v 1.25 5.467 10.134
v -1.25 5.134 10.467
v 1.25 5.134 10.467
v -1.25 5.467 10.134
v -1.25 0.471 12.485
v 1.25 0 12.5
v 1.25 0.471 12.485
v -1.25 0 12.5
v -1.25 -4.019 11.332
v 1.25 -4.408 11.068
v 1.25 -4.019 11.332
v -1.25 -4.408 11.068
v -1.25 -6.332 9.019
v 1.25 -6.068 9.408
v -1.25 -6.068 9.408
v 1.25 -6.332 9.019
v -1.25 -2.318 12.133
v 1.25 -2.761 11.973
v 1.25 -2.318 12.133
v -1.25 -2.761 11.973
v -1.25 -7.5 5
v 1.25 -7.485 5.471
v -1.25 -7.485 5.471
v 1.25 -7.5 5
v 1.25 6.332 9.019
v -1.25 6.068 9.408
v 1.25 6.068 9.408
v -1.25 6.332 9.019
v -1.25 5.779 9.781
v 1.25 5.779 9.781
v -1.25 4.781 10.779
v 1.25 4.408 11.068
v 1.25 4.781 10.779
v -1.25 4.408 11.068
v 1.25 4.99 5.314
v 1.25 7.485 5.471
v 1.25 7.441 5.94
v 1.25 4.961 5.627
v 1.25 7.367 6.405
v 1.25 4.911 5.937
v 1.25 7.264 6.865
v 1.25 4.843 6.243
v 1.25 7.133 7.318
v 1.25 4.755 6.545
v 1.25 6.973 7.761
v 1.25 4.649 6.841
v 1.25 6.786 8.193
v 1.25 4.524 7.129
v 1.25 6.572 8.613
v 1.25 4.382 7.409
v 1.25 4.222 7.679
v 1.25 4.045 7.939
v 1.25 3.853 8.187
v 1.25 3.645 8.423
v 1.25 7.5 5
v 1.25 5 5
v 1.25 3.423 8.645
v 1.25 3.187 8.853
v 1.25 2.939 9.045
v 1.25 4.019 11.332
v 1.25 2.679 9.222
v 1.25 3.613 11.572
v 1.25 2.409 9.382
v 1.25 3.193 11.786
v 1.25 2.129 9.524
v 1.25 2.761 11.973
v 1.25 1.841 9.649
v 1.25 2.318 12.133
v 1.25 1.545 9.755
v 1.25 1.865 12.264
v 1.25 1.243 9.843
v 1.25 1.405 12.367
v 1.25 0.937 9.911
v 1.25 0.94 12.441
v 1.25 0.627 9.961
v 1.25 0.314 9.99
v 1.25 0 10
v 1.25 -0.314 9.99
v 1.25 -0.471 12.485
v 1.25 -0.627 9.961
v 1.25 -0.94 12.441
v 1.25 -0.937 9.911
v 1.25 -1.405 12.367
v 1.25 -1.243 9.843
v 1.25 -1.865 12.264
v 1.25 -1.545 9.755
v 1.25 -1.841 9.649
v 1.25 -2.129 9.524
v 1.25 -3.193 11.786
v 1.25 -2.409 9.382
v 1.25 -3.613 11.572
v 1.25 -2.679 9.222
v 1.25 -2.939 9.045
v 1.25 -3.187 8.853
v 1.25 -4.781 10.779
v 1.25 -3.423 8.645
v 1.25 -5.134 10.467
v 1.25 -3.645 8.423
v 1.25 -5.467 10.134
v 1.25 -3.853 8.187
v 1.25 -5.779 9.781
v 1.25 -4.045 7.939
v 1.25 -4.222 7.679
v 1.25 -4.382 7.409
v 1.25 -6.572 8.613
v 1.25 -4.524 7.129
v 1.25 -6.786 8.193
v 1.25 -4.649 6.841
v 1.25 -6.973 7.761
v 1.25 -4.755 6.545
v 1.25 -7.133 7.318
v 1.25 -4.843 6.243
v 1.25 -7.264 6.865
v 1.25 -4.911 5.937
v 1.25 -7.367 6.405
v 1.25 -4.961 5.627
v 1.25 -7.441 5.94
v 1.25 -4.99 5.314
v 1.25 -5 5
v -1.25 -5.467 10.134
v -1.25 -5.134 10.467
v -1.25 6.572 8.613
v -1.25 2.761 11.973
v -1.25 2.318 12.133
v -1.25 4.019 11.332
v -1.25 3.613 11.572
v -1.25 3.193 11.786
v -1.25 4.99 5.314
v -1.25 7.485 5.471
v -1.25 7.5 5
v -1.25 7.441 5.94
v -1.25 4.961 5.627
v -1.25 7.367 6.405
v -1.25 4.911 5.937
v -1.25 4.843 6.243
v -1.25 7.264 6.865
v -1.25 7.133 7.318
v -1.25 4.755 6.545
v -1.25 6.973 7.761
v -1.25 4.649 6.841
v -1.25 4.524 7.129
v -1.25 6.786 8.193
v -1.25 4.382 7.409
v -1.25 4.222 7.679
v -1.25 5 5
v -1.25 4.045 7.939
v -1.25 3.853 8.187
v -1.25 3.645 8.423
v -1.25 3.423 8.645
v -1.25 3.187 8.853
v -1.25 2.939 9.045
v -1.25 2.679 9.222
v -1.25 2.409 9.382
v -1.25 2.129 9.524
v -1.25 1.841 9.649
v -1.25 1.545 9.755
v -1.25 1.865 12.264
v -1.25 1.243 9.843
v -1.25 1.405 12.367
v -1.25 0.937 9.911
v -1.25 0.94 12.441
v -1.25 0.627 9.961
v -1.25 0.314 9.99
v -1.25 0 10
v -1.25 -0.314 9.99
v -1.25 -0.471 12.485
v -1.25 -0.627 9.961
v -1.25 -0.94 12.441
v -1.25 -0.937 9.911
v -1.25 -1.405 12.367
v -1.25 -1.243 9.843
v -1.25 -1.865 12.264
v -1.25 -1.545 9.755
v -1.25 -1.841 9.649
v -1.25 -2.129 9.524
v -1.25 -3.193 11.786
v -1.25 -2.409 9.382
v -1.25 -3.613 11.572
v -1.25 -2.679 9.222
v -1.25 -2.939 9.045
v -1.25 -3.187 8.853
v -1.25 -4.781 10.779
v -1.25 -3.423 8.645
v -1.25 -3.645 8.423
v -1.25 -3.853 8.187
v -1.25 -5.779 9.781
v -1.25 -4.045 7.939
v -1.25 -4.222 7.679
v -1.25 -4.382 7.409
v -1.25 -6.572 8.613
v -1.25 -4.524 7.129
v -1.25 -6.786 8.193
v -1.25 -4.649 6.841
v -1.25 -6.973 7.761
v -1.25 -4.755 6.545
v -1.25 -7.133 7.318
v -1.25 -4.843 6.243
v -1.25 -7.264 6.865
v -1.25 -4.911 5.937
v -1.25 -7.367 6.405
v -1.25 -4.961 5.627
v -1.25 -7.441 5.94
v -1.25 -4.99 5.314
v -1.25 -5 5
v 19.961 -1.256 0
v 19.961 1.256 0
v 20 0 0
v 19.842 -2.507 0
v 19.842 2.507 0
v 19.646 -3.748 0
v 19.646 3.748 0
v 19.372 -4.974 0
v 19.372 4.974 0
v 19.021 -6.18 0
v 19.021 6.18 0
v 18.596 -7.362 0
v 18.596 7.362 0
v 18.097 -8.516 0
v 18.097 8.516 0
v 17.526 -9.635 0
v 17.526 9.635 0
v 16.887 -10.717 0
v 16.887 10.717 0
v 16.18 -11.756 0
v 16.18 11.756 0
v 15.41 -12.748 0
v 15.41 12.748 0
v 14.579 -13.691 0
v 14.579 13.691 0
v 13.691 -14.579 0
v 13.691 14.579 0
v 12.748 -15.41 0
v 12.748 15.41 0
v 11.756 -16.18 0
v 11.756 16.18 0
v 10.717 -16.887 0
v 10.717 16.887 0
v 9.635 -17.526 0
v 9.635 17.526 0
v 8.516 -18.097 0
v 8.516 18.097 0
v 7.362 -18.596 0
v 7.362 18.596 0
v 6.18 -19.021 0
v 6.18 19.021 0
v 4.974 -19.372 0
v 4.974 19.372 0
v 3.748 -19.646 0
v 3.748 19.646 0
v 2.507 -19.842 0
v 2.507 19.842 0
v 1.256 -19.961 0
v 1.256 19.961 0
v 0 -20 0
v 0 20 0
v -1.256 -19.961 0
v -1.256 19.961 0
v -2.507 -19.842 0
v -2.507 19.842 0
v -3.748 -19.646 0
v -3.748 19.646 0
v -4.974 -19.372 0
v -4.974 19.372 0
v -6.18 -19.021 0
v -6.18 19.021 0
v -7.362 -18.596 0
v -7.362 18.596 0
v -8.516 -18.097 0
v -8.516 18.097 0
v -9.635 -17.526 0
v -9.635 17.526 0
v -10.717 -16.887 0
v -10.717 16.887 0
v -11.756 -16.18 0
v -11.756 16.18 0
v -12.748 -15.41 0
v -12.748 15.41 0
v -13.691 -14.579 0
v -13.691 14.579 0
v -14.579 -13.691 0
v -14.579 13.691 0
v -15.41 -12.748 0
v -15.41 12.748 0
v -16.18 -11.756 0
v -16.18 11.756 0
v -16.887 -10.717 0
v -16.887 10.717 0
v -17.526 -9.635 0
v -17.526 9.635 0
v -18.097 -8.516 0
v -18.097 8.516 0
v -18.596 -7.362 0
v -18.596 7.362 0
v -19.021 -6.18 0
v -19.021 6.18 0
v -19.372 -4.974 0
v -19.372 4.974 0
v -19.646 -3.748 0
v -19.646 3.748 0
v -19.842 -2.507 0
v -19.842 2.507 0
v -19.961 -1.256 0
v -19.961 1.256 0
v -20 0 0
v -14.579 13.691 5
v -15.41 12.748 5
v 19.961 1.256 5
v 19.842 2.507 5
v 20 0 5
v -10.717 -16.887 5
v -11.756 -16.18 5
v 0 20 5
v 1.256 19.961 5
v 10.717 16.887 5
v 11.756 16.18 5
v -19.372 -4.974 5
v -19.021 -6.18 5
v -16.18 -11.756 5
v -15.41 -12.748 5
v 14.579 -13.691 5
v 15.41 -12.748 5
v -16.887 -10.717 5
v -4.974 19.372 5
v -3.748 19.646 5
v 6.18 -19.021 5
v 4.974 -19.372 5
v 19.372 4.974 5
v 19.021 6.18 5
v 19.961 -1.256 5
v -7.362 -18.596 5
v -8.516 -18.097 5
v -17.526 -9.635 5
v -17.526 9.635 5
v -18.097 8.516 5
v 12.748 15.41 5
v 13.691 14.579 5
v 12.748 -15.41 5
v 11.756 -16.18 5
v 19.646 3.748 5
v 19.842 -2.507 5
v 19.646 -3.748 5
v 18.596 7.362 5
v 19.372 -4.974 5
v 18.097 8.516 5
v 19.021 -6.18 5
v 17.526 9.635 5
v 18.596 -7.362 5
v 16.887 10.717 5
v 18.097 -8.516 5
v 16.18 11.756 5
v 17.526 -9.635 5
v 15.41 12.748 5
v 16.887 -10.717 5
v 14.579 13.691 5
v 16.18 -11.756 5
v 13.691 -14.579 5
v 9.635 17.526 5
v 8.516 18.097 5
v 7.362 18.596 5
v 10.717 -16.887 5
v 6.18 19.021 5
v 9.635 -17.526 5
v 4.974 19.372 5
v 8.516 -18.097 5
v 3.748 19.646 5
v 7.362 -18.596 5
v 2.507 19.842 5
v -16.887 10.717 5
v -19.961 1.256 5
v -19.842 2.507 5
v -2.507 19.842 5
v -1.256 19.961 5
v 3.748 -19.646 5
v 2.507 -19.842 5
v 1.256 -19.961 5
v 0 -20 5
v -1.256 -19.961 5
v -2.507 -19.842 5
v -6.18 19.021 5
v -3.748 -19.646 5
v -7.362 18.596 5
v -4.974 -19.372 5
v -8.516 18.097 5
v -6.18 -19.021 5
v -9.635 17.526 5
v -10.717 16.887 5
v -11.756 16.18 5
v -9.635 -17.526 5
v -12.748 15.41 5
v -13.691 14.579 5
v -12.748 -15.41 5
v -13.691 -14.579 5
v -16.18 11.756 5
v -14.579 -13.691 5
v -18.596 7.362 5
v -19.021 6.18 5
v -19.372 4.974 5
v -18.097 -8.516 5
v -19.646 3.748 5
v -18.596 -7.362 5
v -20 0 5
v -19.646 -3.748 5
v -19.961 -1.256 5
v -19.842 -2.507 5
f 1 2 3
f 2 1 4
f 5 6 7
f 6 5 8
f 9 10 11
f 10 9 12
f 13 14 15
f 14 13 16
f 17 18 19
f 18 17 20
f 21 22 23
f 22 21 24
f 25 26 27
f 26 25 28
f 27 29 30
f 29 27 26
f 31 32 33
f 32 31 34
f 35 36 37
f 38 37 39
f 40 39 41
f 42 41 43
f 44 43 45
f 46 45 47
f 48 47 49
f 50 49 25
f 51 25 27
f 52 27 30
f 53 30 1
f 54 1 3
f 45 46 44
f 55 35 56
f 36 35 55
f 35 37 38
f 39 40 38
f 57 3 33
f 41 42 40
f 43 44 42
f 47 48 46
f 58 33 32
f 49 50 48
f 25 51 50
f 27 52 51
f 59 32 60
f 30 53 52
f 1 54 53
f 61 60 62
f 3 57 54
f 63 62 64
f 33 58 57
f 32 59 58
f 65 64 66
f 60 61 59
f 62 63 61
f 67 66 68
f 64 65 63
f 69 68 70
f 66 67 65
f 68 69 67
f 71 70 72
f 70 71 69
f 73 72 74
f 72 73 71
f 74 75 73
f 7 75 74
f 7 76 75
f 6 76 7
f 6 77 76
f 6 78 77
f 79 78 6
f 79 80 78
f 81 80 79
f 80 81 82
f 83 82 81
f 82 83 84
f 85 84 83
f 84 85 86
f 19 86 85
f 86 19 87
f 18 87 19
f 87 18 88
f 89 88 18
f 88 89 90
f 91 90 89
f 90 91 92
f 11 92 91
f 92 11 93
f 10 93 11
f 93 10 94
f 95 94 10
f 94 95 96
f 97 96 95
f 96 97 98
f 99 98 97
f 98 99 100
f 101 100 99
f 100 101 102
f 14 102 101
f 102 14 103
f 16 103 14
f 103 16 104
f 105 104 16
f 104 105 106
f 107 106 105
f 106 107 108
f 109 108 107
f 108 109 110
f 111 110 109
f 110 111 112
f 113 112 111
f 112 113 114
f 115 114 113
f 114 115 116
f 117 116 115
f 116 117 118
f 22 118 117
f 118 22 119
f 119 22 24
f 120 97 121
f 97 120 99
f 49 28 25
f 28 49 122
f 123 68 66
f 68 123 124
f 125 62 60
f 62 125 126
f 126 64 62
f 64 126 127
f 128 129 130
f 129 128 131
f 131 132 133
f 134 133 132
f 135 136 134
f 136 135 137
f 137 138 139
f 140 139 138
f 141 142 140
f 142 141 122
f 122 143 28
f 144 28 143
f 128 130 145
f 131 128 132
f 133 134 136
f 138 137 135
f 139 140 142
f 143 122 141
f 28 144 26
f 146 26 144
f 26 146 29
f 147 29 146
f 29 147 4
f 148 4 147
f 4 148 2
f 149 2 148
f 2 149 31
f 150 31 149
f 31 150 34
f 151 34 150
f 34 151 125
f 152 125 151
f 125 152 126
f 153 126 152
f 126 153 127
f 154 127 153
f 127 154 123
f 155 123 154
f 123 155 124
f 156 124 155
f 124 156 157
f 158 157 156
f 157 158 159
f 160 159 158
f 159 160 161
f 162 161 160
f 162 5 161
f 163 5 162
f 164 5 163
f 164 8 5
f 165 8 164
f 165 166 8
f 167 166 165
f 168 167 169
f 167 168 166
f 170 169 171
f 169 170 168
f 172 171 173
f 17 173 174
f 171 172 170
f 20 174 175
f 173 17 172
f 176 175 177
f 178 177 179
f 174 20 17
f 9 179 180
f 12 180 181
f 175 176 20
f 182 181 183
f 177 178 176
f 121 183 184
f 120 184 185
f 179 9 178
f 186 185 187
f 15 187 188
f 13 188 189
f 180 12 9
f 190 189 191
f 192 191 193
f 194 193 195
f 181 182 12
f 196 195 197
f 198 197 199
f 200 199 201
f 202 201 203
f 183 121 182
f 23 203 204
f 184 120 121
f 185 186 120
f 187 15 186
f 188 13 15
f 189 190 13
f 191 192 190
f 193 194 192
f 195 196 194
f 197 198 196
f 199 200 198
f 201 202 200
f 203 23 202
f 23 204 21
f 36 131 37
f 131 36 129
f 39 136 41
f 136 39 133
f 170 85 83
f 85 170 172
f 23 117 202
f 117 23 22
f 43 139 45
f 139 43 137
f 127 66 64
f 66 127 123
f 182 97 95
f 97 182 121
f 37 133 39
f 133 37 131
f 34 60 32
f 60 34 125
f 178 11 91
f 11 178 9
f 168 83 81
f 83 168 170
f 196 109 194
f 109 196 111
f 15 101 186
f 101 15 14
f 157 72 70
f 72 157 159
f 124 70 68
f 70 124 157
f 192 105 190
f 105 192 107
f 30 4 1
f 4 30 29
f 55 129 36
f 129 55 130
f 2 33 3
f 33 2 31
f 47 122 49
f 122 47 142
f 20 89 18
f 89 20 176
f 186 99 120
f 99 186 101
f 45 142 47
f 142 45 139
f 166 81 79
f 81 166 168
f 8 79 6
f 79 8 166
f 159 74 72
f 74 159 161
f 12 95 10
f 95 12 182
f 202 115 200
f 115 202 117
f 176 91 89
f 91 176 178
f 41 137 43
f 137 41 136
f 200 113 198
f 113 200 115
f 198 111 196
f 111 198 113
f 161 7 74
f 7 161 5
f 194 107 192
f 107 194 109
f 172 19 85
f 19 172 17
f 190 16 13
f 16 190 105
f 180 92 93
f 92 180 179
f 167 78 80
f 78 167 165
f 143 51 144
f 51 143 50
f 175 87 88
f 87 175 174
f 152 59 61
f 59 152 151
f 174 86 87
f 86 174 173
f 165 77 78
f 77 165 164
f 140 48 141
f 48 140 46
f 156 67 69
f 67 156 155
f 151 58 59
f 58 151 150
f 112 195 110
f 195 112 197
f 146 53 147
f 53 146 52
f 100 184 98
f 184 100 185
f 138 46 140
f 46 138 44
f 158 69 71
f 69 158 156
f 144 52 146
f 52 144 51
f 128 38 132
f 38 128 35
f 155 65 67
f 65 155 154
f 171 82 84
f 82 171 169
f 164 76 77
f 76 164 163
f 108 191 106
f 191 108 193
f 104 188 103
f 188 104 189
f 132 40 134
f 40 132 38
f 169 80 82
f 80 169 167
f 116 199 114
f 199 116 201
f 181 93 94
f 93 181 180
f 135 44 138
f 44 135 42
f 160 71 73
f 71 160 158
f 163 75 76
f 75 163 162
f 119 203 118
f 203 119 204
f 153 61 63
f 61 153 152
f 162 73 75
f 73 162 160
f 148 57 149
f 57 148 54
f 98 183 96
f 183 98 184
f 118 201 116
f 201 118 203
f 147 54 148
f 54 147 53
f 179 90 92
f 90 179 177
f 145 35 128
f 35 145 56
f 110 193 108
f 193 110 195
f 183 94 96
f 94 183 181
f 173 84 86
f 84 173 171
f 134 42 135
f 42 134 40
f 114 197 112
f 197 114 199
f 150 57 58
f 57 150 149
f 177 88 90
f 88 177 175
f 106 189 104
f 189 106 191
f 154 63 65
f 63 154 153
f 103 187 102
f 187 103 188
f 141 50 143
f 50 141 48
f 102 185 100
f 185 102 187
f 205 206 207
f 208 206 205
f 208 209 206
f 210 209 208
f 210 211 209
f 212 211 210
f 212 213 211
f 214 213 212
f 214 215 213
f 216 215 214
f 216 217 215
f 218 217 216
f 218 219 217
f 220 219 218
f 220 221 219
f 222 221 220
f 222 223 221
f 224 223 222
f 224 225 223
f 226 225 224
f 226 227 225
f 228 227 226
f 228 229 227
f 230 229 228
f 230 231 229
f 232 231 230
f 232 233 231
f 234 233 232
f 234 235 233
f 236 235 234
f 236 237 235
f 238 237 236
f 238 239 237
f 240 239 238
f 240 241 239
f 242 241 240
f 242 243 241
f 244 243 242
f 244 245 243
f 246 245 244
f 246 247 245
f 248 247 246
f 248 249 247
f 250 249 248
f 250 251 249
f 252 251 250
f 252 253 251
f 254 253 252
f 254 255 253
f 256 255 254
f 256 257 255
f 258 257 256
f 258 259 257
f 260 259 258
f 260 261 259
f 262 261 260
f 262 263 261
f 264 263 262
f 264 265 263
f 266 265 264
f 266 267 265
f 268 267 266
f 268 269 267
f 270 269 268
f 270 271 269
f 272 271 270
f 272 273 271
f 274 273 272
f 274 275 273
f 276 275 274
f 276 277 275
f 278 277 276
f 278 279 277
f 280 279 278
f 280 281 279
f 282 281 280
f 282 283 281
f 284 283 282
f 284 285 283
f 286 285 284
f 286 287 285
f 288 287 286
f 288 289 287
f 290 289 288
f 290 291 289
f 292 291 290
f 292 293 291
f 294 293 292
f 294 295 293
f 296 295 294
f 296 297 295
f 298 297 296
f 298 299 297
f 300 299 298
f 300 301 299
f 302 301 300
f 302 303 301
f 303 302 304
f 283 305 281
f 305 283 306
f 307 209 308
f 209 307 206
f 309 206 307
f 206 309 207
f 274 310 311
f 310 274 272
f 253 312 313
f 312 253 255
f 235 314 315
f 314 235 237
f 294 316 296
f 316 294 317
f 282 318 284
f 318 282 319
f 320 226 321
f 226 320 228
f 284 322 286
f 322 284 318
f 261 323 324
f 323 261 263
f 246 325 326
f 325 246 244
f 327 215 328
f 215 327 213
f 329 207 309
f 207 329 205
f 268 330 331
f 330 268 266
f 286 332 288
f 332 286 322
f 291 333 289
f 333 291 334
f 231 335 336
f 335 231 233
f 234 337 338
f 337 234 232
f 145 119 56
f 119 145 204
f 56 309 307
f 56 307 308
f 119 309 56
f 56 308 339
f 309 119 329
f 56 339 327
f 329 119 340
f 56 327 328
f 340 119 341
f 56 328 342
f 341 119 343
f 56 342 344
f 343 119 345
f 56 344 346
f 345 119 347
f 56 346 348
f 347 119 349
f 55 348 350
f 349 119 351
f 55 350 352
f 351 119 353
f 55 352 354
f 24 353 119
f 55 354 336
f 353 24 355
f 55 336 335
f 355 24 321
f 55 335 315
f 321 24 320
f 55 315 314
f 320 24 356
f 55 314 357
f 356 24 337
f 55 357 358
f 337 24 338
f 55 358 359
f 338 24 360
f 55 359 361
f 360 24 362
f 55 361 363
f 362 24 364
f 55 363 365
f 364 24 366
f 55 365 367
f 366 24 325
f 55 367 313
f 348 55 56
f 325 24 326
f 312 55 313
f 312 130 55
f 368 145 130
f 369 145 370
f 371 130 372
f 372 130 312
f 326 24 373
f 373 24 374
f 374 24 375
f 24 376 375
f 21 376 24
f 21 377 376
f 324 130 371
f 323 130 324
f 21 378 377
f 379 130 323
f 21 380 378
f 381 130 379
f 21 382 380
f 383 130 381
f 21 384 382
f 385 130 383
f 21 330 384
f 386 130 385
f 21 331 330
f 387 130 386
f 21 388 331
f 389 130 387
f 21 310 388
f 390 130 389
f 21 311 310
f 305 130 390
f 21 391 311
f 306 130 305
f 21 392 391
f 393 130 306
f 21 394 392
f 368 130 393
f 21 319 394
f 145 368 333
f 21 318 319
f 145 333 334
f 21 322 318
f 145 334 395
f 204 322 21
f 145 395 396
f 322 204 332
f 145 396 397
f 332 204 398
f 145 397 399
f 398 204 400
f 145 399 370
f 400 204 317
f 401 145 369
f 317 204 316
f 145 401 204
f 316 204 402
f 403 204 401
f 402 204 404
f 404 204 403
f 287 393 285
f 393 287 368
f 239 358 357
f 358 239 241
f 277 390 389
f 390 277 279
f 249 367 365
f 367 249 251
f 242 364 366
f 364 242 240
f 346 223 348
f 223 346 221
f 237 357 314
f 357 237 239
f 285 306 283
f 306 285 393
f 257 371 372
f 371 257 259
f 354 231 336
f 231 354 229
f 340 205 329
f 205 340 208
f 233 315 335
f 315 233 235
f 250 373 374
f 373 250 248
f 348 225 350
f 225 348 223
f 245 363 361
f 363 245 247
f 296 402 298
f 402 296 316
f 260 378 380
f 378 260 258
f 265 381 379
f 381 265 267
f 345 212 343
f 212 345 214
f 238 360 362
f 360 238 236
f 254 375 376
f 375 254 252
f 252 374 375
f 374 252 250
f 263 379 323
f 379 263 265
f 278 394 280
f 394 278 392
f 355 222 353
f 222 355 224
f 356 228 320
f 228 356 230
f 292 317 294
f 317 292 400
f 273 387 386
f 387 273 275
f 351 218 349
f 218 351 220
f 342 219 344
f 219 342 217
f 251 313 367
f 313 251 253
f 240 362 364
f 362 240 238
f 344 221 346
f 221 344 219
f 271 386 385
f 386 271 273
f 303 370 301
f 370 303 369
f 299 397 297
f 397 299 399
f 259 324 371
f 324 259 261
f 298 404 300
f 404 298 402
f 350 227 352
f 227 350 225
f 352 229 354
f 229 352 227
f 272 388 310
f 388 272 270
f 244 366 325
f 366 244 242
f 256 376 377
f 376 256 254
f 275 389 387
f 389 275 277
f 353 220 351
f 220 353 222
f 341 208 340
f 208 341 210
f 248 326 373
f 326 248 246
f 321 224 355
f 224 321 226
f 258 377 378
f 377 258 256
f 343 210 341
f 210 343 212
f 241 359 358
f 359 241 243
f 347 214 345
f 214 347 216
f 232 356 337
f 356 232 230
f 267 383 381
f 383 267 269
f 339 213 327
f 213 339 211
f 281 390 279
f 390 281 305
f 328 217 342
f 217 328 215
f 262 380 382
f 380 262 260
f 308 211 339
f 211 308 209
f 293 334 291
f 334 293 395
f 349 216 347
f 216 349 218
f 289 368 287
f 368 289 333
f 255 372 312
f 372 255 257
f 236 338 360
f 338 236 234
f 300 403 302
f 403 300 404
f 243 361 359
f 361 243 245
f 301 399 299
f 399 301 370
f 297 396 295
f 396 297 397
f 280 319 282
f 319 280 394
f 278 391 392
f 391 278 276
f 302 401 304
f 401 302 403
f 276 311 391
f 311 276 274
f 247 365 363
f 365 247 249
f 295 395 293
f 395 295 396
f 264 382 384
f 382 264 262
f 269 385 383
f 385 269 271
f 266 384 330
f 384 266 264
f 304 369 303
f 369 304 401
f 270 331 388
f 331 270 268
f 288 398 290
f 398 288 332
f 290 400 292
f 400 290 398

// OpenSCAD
// file: tubes/tube.scad
module tube(height, inner_diameter, outer_diameter) {
    difference() {
        cylinder(h=height, d=outer_diameter);
        cylinder(h=height, d=inner_diameter);
    }
}
// main file
use <tubes/tube.scad>;

$fn=100;
module nose_cone_endcap(diameter, height, loop, loop_params) {
    
    loop_inner_diameter = loop_params[0];
    loop_outer_diameter = loop_params[1];
    loop_thickness      = loop_params[2];
    

    cylinder(d=diameter, h=height);

    difference() {    
        
        translate([-loop_thickness/2,0,height]) {
        rotate([0,90,0])
        tube(height=loop_thickness, inner_diameter=loop_inner_diameter, outer_diameter=loop_outer_diameter);
            
    }
    translate([0,0,-loop_outer_diameter])
    cylinder(d=diameter, h=loop_outer_diameter);
    }
}

nose_cone_endcap(diameter=40, height=5, loop=true, loop_params=[10,15,2.5]);
